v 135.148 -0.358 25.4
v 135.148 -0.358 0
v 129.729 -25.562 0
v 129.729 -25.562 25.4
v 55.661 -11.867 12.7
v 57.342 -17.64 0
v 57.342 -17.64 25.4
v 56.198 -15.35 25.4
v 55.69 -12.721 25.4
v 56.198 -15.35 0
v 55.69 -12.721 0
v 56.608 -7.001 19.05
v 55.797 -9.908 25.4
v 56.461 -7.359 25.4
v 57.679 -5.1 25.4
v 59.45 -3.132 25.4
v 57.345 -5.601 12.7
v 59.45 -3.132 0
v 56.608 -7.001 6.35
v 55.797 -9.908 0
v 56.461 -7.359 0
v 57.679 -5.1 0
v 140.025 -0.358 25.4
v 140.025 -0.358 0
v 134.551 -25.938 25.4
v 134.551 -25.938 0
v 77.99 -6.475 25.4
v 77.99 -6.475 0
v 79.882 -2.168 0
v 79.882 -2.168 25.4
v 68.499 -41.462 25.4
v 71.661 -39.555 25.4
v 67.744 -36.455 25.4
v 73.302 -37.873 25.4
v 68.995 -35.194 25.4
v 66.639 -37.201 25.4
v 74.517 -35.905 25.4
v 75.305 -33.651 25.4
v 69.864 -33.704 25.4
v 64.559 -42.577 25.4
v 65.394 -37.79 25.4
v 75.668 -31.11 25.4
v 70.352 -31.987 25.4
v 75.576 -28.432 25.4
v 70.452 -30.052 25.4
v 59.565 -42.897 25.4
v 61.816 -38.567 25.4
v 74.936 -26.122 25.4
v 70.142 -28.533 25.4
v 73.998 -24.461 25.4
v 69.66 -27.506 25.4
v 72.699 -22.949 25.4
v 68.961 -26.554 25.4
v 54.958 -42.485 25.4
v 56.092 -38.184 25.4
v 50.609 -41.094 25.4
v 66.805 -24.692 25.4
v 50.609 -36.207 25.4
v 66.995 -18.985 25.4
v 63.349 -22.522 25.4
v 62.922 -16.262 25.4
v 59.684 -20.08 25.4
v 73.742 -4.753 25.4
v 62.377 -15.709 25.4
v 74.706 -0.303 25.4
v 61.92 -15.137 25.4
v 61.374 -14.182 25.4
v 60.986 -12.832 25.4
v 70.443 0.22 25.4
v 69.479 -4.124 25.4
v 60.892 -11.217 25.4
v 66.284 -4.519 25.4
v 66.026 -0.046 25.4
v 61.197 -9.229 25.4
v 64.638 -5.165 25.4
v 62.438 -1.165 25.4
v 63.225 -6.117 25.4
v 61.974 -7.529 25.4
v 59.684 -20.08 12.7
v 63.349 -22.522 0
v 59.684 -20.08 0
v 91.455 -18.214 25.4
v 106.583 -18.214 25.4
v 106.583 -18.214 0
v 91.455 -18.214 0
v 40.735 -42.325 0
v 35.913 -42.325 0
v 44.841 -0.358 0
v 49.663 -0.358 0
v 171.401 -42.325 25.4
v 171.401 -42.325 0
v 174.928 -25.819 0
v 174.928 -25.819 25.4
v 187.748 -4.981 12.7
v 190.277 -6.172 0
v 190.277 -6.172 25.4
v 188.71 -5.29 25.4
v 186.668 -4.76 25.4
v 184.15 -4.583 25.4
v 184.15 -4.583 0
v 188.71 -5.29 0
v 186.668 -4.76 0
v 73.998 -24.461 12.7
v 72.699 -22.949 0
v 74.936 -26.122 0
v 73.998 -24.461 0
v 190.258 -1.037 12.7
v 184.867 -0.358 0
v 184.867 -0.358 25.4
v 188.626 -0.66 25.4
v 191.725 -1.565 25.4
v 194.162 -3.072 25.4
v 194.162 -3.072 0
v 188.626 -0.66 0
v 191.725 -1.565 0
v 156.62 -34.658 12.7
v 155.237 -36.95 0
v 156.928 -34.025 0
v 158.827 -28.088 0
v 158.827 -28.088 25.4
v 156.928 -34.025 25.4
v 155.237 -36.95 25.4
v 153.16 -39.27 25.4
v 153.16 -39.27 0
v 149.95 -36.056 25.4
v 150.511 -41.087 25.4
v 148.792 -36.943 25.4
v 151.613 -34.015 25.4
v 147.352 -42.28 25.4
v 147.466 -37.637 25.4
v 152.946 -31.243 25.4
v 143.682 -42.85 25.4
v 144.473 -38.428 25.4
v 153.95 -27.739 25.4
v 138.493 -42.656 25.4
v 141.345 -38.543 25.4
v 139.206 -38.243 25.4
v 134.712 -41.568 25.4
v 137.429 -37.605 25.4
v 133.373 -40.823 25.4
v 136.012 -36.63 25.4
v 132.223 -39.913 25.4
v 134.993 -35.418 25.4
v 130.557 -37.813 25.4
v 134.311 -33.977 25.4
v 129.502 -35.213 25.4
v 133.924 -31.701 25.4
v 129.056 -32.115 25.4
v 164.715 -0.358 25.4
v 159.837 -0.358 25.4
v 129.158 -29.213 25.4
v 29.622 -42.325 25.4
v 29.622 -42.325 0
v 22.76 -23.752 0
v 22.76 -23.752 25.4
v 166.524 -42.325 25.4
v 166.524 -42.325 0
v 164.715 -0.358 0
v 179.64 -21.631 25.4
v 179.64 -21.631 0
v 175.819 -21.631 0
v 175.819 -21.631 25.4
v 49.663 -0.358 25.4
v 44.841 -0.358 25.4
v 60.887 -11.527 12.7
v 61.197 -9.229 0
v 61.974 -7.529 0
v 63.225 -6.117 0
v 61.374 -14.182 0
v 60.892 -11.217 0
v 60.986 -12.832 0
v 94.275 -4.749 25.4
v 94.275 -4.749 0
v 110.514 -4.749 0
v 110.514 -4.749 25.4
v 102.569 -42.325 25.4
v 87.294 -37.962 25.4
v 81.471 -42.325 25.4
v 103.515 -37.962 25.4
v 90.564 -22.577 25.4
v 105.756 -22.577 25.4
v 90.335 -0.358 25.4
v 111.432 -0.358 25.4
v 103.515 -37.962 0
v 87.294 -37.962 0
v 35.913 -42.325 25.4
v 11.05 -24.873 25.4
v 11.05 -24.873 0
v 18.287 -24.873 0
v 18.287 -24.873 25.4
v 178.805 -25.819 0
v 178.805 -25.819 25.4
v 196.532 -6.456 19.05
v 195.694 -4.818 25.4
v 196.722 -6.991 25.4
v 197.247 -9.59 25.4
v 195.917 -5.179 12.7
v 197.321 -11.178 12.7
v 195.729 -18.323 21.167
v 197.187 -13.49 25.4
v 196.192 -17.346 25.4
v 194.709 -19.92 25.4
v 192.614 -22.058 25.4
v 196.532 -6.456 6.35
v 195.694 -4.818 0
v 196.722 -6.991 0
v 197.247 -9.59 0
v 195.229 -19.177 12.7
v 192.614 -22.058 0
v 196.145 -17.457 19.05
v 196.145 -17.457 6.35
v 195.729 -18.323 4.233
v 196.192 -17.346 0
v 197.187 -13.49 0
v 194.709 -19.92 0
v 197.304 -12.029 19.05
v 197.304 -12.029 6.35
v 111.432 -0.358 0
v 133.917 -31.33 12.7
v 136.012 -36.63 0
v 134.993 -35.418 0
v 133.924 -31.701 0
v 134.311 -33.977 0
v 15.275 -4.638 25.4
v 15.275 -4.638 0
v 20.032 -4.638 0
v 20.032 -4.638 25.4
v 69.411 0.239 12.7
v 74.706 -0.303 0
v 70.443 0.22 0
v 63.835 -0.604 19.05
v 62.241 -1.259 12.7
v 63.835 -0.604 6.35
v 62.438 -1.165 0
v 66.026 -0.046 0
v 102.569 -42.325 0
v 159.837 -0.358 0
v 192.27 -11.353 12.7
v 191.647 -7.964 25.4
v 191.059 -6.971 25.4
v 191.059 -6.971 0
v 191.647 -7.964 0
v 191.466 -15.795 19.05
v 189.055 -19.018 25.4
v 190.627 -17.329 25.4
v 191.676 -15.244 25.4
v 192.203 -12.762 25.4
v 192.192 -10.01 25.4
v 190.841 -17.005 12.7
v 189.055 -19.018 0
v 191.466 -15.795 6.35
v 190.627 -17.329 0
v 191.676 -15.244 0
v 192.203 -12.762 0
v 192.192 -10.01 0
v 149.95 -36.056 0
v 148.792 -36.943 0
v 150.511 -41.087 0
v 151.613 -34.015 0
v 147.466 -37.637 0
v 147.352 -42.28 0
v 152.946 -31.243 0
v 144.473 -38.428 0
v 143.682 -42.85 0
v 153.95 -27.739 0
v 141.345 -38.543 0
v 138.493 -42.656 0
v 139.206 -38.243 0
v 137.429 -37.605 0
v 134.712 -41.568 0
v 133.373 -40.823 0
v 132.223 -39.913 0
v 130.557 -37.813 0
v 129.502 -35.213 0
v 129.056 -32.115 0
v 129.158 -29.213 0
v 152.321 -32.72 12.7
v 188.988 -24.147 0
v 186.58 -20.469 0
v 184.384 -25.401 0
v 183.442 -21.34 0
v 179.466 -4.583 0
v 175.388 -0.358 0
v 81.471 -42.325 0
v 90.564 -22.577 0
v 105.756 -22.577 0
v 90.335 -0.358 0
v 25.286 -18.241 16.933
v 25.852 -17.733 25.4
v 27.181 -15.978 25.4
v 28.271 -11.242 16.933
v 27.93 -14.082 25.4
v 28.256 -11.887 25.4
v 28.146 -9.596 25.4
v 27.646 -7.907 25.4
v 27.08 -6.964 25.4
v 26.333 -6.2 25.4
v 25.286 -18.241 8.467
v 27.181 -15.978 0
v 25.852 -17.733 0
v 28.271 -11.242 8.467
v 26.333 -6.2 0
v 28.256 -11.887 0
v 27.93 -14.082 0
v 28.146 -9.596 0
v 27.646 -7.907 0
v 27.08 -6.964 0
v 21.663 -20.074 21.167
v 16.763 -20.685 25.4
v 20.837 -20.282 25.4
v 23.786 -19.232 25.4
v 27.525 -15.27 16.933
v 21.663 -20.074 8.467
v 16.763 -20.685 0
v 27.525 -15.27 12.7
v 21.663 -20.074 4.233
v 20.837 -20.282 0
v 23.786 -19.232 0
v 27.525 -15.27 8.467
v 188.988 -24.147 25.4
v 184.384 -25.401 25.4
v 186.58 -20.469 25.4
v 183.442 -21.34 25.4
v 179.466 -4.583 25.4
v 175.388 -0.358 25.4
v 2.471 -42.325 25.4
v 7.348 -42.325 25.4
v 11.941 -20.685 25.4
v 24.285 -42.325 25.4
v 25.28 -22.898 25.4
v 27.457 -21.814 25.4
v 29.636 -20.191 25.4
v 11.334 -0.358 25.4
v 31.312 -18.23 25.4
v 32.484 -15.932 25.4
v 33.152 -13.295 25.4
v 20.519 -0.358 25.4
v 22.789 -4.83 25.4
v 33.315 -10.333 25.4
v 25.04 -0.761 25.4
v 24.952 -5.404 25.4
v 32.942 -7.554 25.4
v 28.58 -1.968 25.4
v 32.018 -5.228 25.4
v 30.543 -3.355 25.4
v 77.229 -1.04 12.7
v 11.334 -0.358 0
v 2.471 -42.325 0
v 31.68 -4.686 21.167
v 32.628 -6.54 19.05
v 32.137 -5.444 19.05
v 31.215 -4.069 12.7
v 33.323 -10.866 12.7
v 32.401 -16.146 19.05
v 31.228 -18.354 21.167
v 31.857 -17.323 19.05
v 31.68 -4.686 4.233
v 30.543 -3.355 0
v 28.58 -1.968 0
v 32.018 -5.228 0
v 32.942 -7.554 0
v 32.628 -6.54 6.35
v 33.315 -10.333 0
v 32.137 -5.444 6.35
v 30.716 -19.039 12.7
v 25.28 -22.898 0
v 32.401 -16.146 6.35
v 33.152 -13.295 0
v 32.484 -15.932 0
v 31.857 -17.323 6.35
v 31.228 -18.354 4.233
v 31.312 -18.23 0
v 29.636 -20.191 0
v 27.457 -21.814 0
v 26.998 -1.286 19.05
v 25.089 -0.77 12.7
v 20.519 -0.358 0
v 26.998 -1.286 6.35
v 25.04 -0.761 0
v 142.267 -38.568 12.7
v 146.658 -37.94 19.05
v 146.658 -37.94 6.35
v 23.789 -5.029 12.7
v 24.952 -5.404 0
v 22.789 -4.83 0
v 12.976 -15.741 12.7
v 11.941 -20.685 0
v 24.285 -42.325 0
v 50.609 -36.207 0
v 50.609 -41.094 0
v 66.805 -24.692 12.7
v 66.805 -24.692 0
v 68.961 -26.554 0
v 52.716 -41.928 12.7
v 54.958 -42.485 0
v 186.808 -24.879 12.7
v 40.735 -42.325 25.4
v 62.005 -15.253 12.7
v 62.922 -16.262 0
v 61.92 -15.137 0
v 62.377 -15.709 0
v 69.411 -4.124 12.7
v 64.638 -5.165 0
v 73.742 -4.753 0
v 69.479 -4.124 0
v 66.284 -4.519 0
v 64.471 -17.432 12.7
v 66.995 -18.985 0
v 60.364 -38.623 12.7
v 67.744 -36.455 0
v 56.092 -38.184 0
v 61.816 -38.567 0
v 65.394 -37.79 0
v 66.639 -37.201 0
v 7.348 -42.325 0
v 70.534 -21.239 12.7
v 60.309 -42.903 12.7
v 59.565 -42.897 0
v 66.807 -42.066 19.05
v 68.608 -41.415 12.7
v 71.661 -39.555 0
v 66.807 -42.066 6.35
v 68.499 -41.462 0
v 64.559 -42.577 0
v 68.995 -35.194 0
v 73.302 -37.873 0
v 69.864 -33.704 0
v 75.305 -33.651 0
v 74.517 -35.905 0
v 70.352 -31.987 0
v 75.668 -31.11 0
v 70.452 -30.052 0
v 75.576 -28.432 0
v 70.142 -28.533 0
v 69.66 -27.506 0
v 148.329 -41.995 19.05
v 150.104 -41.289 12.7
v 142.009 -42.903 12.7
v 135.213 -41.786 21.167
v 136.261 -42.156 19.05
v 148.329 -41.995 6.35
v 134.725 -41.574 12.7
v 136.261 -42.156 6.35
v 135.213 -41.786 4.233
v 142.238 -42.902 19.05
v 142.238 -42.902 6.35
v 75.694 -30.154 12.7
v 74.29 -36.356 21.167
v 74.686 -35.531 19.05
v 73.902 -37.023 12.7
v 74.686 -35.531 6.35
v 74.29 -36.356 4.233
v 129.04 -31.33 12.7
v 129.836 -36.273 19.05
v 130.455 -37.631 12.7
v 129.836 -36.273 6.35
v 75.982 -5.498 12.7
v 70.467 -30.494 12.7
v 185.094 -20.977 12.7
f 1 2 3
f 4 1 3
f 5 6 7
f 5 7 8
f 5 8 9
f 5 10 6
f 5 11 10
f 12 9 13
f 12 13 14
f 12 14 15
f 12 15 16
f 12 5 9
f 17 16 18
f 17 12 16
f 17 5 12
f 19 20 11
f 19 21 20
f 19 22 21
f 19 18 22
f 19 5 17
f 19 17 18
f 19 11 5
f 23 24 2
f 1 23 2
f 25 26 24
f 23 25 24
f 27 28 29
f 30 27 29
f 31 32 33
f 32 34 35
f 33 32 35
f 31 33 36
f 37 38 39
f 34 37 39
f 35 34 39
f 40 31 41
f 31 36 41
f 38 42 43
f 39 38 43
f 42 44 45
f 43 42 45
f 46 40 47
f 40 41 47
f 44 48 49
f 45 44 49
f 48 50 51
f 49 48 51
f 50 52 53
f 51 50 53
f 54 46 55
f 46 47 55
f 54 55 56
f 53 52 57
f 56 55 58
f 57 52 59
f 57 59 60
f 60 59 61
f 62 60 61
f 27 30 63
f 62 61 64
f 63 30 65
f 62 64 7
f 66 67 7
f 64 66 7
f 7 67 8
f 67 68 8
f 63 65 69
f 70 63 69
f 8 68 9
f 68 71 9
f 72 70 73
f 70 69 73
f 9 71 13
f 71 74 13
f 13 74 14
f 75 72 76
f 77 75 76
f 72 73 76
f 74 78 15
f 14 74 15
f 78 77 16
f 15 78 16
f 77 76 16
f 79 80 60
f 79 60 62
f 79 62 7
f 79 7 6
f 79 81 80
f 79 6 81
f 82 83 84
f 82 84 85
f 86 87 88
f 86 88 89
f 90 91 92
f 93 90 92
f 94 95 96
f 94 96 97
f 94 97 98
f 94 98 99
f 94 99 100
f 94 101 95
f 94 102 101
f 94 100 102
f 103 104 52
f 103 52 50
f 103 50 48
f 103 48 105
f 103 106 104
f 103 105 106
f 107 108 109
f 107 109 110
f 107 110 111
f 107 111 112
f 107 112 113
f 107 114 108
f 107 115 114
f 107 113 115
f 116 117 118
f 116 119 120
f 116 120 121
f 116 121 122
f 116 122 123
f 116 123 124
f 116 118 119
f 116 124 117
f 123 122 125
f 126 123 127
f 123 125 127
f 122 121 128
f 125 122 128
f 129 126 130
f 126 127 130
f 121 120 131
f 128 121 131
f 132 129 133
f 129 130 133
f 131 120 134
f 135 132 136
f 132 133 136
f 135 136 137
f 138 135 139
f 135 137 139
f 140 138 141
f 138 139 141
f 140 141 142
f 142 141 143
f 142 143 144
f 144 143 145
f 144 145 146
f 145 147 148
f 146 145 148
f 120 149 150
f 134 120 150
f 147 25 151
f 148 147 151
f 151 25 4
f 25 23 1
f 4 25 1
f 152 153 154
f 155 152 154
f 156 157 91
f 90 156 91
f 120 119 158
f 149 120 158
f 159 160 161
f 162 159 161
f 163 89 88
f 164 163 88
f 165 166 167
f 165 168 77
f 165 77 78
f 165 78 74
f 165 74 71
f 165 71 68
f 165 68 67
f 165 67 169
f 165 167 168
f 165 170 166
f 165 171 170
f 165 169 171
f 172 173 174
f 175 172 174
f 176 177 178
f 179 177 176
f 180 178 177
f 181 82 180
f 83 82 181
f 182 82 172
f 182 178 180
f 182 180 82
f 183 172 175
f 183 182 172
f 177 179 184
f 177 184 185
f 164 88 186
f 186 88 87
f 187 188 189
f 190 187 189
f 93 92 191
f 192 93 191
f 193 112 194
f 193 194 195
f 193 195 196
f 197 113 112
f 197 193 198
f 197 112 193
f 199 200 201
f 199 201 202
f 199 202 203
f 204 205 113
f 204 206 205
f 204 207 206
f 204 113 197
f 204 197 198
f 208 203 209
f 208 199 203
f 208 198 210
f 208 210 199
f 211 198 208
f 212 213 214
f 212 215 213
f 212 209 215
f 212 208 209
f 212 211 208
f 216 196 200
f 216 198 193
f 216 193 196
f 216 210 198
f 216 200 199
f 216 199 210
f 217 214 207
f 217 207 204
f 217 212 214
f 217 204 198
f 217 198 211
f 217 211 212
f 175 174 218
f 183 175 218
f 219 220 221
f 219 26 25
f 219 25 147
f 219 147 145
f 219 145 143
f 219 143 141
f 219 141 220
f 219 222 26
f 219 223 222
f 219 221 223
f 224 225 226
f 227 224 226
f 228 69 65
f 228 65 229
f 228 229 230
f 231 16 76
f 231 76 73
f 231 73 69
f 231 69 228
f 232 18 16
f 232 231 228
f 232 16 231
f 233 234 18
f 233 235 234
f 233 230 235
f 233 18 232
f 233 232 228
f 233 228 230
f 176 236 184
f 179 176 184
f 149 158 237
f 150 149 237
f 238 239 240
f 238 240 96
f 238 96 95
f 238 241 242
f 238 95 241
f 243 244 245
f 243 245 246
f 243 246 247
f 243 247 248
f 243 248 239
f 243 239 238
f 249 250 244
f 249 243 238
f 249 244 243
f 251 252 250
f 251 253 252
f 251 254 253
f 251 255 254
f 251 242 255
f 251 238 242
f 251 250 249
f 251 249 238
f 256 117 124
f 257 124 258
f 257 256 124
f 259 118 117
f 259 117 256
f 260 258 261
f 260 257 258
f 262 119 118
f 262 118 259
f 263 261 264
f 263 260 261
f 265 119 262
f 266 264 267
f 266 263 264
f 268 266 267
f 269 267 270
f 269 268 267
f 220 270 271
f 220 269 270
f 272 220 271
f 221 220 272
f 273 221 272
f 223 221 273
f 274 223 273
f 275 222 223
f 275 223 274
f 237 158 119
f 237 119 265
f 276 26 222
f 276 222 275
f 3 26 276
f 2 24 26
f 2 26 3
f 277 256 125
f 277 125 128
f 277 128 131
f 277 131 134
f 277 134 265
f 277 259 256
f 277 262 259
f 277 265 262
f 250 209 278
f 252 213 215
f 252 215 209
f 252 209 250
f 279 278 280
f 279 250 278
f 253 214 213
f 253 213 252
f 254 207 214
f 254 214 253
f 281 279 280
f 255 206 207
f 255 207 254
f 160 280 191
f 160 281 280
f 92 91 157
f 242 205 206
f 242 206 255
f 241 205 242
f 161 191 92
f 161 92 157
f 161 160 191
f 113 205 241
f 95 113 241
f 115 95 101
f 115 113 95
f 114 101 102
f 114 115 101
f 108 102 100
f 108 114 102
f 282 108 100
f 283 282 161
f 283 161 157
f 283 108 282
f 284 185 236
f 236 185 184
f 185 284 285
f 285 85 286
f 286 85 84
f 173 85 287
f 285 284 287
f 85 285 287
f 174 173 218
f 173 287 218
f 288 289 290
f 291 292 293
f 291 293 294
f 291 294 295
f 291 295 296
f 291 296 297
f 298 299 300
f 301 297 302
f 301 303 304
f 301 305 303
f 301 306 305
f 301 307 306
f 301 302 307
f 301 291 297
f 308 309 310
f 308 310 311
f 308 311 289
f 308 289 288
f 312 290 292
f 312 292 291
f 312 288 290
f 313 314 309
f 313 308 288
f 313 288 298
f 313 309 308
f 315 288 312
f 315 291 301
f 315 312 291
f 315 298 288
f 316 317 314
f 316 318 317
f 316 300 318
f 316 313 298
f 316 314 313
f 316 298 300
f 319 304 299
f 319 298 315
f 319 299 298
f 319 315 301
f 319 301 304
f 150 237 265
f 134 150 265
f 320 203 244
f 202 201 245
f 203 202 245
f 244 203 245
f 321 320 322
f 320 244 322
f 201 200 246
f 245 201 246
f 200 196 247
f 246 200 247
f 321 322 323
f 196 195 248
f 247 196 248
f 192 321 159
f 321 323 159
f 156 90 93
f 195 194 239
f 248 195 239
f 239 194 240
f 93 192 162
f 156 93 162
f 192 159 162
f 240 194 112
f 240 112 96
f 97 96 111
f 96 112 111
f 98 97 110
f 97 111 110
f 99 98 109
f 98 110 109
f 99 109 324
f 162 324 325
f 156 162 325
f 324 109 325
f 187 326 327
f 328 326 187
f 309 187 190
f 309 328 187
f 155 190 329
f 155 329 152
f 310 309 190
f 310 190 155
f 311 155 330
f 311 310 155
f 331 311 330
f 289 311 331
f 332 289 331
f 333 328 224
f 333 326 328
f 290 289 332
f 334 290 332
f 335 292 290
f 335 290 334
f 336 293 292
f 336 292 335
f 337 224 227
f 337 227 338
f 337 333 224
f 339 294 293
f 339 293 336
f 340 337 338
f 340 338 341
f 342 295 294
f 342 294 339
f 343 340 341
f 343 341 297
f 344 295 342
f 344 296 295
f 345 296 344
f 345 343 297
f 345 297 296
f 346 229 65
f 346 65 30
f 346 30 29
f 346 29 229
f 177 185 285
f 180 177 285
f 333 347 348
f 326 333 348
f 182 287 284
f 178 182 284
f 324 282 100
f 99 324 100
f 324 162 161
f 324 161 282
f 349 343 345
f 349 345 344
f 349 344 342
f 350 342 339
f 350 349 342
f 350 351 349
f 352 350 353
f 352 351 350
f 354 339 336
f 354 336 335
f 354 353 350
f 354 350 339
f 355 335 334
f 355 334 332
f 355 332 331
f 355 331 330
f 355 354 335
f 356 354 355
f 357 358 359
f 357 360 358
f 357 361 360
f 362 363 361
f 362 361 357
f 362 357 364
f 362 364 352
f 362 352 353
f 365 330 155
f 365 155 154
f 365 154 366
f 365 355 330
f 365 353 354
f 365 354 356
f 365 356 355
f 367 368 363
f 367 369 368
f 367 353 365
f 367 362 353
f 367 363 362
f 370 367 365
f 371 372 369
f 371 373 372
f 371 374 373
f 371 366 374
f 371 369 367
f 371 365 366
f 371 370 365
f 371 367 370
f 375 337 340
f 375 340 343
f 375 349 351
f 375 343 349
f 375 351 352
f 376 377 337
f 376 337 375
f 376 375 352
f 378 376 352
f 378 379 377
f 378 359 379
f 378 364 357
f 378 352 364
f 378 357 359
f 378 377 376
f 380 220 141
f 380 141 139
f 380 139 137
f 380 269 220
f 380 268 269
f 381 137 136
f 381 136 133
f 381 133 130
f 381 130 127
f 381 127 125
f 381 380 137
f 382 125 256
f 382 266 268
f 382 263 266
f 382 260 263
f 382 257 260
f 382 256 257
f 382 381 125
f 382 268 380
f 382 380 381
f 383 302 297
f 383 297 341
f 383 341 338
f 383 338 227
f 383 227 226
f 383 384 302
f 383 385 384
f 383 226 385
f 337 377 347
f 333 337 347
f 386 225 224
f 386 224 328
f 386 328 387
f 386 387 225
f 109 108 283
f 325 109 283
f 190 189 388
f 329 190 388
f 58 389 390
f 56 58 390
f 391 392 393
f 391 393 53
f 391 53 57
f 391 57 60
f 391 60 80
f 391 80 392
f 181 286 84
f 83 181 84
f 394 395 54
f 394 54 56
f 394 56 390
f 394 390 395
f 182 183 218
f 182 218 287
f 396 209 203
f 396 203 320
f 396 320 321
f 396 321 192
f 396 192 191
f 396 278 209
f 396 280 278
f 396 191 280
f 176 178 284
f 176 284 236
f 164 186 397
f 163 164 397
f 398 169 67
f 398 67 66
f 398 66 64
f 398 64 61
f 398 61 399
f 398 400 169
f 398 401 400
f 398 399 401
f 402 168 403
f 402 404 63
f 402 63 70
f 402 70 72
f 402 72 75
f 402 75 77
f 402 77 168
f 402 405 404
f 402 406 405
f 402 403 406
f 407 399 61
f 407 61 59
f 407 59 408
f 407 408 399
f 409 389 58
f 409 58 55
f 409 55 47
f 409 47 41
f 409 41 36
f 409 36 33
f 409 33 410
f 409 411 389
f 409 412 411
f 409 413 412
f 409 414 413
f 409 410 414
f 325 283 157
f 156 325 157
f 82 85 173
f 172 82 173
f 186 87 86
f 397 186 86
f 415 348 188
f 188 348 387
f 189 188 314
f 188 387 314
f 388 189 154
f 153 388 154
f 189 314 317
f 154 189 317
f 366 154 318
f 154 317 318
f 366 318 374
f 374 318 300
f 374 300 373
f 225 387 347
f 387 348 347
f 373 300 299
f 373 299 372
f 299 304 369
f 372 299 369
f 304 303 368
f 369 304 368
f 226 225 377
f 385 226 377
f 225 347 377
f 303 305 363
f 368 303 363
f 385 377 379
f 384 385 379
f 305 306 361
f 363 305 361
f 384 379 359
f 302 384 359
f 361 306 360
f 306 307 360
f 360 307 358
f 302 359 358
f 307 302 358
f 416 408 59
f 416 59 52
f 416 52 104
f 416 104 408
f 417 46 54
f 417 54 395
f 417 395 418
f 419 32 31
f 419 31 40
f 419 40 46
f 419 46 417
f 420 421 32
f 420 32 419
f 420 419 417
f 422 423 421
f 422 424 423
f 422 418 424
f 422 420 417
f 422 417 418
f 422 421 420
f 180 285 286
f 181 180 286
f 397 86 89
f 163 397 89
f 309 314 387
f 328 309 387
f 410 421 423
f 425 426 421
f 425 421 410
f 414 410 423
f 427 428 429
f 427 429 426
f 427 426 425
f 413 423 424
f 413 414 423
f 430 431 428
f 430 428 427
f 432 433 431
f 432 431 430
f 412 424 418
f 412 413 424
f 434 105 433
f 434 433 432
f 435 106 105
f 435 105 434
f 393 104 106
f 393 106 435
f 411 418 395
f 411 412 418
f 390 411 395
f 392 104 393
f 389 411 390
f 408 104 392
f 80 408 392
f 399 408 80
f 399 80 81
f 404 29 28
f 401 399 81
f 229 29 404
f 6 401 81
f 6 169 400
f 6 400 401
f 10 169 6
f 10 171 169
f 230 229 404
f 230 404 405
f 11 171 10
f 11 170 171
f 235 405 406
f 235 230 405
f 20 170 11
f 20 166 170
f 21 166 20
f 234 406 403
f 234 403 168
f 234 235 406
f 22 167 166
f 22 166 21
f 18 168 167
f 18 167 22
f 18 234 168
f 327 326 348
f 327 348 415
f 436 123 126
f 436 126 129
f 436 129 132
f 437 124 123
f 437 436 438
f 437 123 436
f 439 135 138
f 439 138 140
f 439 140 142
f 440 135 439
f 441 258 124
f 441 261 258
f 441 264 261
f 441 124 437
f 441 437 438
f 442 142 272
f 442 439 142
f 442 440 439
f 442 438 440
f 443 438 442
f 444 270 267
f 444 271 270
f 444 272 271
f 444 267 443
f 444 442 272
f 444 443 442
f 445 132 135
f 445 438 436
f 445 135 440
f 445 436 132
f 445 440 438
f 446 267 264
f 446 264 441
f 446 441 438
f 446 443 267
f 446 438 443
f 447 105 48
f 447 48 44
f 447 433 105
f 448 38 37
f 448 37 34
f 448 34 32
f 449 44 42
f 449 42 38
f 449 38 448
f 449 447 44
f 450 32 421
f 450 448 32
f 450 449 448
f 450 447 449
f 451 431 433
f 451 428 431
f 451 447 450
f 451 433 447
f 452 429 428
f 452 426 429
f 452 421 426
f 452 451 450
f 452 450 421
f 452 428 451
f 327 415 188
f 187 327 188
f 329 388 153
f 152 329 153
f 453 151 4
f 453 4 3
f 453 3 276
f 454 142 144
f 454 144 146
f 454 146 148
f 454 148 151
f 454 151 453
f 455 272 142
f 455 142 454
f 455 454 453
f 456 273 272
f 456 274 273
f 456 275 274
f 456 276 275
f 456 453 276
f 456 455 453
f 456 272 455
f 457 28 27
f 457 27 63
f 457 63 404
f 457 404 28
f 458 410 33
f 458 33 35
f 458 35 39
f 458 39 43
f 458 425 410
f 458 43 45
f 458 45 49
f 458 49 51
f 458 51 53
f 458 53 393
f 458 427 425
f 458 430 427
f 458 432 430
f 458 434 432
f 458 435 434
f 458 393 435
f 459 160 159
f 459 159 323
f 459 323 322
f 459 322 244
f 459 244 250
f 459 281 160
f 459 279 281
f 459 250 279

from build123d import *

# Parameters (mm, degrees)
F2_DEPTH = 25.4


with BuildPart() as f2:
    # F1 (on face) → F2 (new body)
    with BuildSketch(Plane.XY):
        Polygon((90.3345299513, -0.3582152179), (81.4709995595, -42.3245057464), (102.5689573936, -42.3245057464), (103.5150129691, -37.9616280924), (87.2942931019, -37.9616280924), (90.564155091, -22.5767437336), (105.7561543324, -22.5767437336), (106.5828048352, -18.2138660797), (91.4551006329, -18.2138660797), (94.2748973482, -4.7486478886), (110.5139872266, -4.7486478886), (111.4324877854, -0.3582152179), align=None)
    extrude(amount=F2_DEPTH)


with BuildPart() as f2b:
    # F1 (on face) → F2, piece 2 (new body)
    with BuildSketch(Plane.XY):
        with BuildLine():
            add(Edge.make_bspline(
                [(75.6936310451, -30.1543733432), (75.6936310451, -36.2072920252), (71.6614135923, -39.5552265618)],
                knots=[0, 0, 0, 1, 1, 1], degree=2))
            add(Edge.make_bspline(
                [(74.9358680841, -26.1221558903), (75.6936310451, -27.8581219463), (75.6936310451, -30.1543733432)],
                knots=[0, 0, 0, 1, 1, 1], degree=2))
            add(Edge.make_bspline(
                [(72.6993192236, -22.9487364599), (74.1781051232, -24.3861898343), (74.9358680841, -26.1221558903)],
                knots=[0, 0, 0, 1, 1, 1], degree=2))
            add(Edge.make_bspline(
                [(66.9954307539, -18.985406549), (71.2205333241, -21.5112830855), (72.6993192236, -22.9487364599)],
                knots=[0, 0, 0, 1, 1, 1], degree=2))
            add(Edge.make_bspline(
                [(62.9218807759, -16.2620523923), (63.9827489213, -17.2402554874), (66.9954307539, -18.985406549)],
                knots=[0, 0, 0, 1, 1, 1], degree=2))
            add(Edge.make_bspline(
                [(61.3742073345, -14.1816486268), (61.8610126306, -15.2838492973), (62.9218807759, -16.2620523923)],
                knots=[0, 0, 0, 1, 1, 1], degree=2))
            add(Edge.make_bspline(
                [(60.8874020383, -11.5271820121), (60.8874020383, -13.0794479563), (61.3742073345, -14.1816486268)],
                knots=[0, 0, 0, 1, 1, 1], degree=2))
            add(Edge.make_bspline(
                [(63.2249859603, -6.1172137212), (60.8874020383, -8.1103599336), (60.8874020383, -11.5271820121)],
                knots=[0, 0, 0, 1, 1, 1], degree=2))
            add(Edge.make_bspline(
                [(69.4110872234, -4.1240675087), (65.5625698823, -4.1240675087), (63.2249859603, -6.1172137212)],
                knots=[0, 0, 0, 1, 1, 1], degree=2))
            add(Edge.make_bspline(
                [(73.7418173578, -4.7532403914), (71.3858634246, -4.1240675087), (69.4110872234, -4.1240675087)],
                knots=[0, 0, 0, 1, 1, 1], degree=2))
            add(Edge.make_bspline(
                [(77.9898824419, -6.4754289391), (76.0977712909, -5.3824132742), (73.7418173578, -4.7532403914)],
                knots=[0, 0, 0, 1, 1, 1], degree=2))
            Line((77.9898824419, -6.4754289391), (79.8819935929, -2.1676613186))
            add(Edge.make_bspline(
                [(74.7062429445, -0.3031051844), (77.1632319391, -0.845020514), (79.8819935929, -2.1676613186)],
                knots=[0, 0, 0, 1, 1, 1], degree=2))
            add(Edge.make_bspline(
                [(69.4110872234, 0.2388101453), (72.2492539498, 0.2388101453), (74.7062429445, -0.3031051844)],
                knots=[0, 0, 0, 1, 1, 1], degree=2))
            add(Edge.make_bspline(
                [(59.4499486639, -3.1320869053), (63.2387634687, 0.2388101453), (69.4110872234, 0.2388101453)],
                knots=[0, 0, 0, 1, 1, 1], degree=2))
            add(Edge.make_bspline(
                [(55.6611338592, -11.8670272188), (55.6611338592, -6.5029839558), (59.4499486639, -3.1320869053)],
                knots=[0, 0, 0, 1, 1, 1], degree=2))
            add(Edge.make_bspline(
                [(57.3419898816, -17.6398032304), (55.6611338592, -15.201184247), (55.6611338592, -11.8670272188)],
                knots=[0, 0, 0, 1, 1, 1], degree=2))
            add(Edge.make_bspline(
                [(63.3489835357, -22.5216337001), (59.0228459041, -20.0784222139), (57.3419898816, -17.6398032304)],
                knots=[0, 0, 0, 1, 1, 1], degree=2))
            add(Edge.make_bspline(
                [(68.9610219496, -26.5538511529), (67.4546810333, -24.8454401137), (63.3489835357, -22.5216337001)],
                knots=[0, 0, 0, 1, 1, 1], degree=2))
            add(Edge.make_bspline(
                [(70.4673628659, -30.4942185499), (70.4673628659, -28.2622621922), (68.9610219496, -26.5538511529)],
                knots=[0, 0, 0, 1, 1, 1], degree=2))
            add(Edge.make_bspline(
                [(67.7440087093, -36.4552871761), (70.4673628659, -34.2876258575), (70.4673628659, -30.4942185499)],
                knots=[0, 0, 0, 1, 1, 1], degree=2))
            add(Edge.make_bspline(
                [(60.3638567199, -38.6229484947), (65.0206545526, -38.6229484947), (67.7440087093, -36.4552871761)],
                knots=[0, 0, 0, 1, 1, 1], degree=2))
            add(Edge.make_bspline(
                [(50.6093807861, -36.2072920252), (55.2569936133, -38.6229484947), (60.3638567199, -38.6229484947)],
                knots=[0, 0, 0, 1, 1, 1], degree=2))
            Line((50.6093807861, -36.2072920252), (50.6093807861, -41.0937149977))
            add(Edge.make_bspline(
                [(54.9584809317, -42.4852433441), (52.6484520265, -42.0673255899), (50.6093807861, -41.0937149977)],
                knots=[0, 0, 0, 1, 1, 1], degree=2))
            add(Edge.make_bspline(
                [(60.3087466863, -42.9031610984), (57.2685098369, -42.9031610984), (54.9584809317, -42.4852433441)],
                knots=[0, 0, 0, 1, 1, 1], degree=2))
            add(Edge.make_bspline(
                [(71.6614135923, -39.5552265618), (67.6291961394, -42.9031610984), (60.3087466863, -42.9031610984)],
                knots=[0, 0, 0, 1, 1, 1], degree=2))
        make_face()
    extrude(amount=F2_DEPTH)


with BuildPart() as f2c:
    # F1 (on face) → F2, piece 3 (new body)
    with BuildSketch(Plane.XY):
        Polygon((49.6633252106, -0.3582152179), (44.8411972773, -0.3582152179), (35.9133718464, -42.3245057464), (40.7354997798, -42.3245057464), align=None)
    extrude(amount=F2_DEPTH)


with BuildPart() as f2d:
    # F1 (on face) → F2, piece 4 (new body)
    with BuildSketch(Plane.XY):
        with BuildLine():
            add(Edge.make_bspline(
                [(158.8271166159, -28.087747086), (157.2472956549, -35.6378216788), (153.1599681685, -39.2704913886)],
                knots=[0, 0, 0, 1, 1, 1], degree=2))
            Line((158.8271166159, -28.087747086), (164.7147051974, -0.3582152179))
            Line((164.7147051974, -0.3582152179), (159.8374672305, -0.3582152179))
            Line((159.8374672305, -0.3582152179), (153.949878649, -27.7387168737))
            add(Edge.make_bspline(
                [(149.9498087158, -36.055739433), (152.6915328836, -33.5436404049), (153.949878649, -27.7387168737)],
                knots=[0, 0, 0, 1, 1, 1], degree=2))
            add(Edge.make_bspline(
                [(142.266551542, -38.5678384612), (147.208084548, -38.5678384612), (149.9498087158, -36.055739433)],
                knots=[0, 0, 0, 1, 1, 1], degree=2))
            add(Edge.make_bspline(
                [(136.011562737, -36.6298022822), (138.1057440109, -38.5678384612), (142.266551542, -38.5678384612)],
                knots=[0, 0, 0, 1, 1, 1], degree=2))
            add(Edge.make_bspline(
                [(133.9173814631, -31.3300540583), (133.9173814631, -34.6917661033), (136.011562737, -36.6298022822)],
                knots=[0, 0, 0, 1, 1, 1], degree=2))
            add(Edge.make_bspline(
                [(134.5511468486, -25.9384557786), (133.9173814631, -28.978692628), (133.9173814631, -31.3300540583)],
                knots=[0, 0, 0, 1, 1, 1], degree=2))
            Line((134.5511468486, -25.9384557786), (140.0254101787, -0.3582152179))
            Line((140.0254101787, -0.3582152179), (135.1481722118, -0.3582152179))
            Line((135.1481722118, -0.3582152179), (129.7290189153, -25.5618705495))
            add(Edge.make_bspline(
                [(129.0401434962, -31.3300540583), (129.0401434962, -29.0062476448), (129.7290189153, -25.5618705495)],
                knots=[0, 0, 0, 1, 1, 1], degree=2))
            add(Edge.make_bspline(
                [(132.2227479322, -39.9134417797), (129.0401434962, -36.923722461), (129.0401434962, -31.3300540583)],
                knots=[0, 0, 0, 1, 1, 1], degree=2))
            add(Edge.make_bspline(
                [(142.0093713855, -42.9031610984), (135.4053523683, -42.9031610984), (132.2227479322, -39.9134417797)],
                knots=[0, 0, 0, 1, 1, 1], degree=2))
            add(Edge.make_bspline(
                [(153.1599681685, -39.2704913886), (149.0726406822, -42.9031610984), (142.0093713855, -42.9031610984)],
                knots=[0, 0, 0, 1, 1, 1], degree=2))
        make_face()
    extrude(amount=F2_DEPTH)


with BuildPart() as f2e:
    # F1 (on face) → F2, piece 5 (new body)
    with BuildSketch(Plane.XY):
        with BuildLine():
            Line((2.470766503, -42.3245057464), (7.3480044699, -42.3245057464))
            Line((7.3480044699, -42.3245057464), (11.0495617215, -24.8729951305))
            Line((11.0495617215, -24.8729951305), (18.2873461244, -24.8729951305))
            Line((18.2873461244, -24.8729951305), (24.2851547729, -42.3245057464))
            Line((24.2851547729, -42.3245057464), (29.6216430191, -42.3245057464))
            Line((29.6216430191, -42.3245057464), (22.7604438454, -23.7524244488))
            add(Edge.make_bspline(
                [(33.3232002708, -10.8658616098), (33.3232002708, -20.8499626832), (22.7604438454, -23.7524244488)],
                knots=[0, 0, 0, 1, 1, 1], degree=2))
            add(Edge.make_bspline(
                [(20.5193024821, -0.3582152179), (33.3232002708, -0.3582152179), (33.3232002708, -10.8658616098)],
                knots=[0, 0, 0, 1, 1, 1], degree=2))
            Line((20.5193024821, -0.3582152179), (11.3342968948, -0.3582152179))
            Line((11.3342968948, -0.3582152179), (2.470766503, -42.3245057464))
        make_face()
        with BuildLine():
            add(Edge.make_bspline(
                [(15.2746642917, -4.6384278216), (12.3446475094, -18.8200764484), (11.9405072635, -20.6846325826)],
                knots=[0, 0, 0, 1, 1, 1], degree=2))
            Line((15.2746642917, -4.6384278216), (20.0324971859, -4.6384278216))
            add(Edge.make_bspline(
                [(26.3334110188, -6.1998787714), (24.3953748399, -4.6384278216), (20.0324971859, -4.6384278216)],
                knots=[0, 0, 0, 1, 1, 1], degree=2))
            add(Edge.make_bspline(
                [(28.2714471978, -11.2424468389), (28.2714471978, -7.7613297213), (26.3334110188, -6.1998787714)],
                knots=[0, 0, 0, 1, 1, 1], degree=2))
            add(Edge.make_bspline(
                [(25.2863203819, -18.2414210964), (28.2714471978, -15.7982096102), (28.2714471978, -11.2424468389)],
                knots=[0, 0, 0, 1, 1, 1], degree=2))
            add(Edge.make_bspline(
                [(16.7626351969, -20.6846325826), (22.301193566, -20.6846325826), (25.2863203819, -18.2414210964)],
                knots=[0, 0, 0, 1, 1, 1], degree=2))
            Line((16.7626351969, -20.6846325826), (11.9405072635, -20.6846325826))
        make_face(mode=Mode.SUBTRACT)
    extrude(amount=F2_DEPTH)


with BuildPart() as f2f:
    # F1 (on face) → F2, piece 6 (new body)
    with BuildSketch(Plane.XY):
        with BuildLine():
            add(Edge.make_bspline(
                [(197.3214750324, -11.1781517998), (197.3214750324, -18.2965311299), (192.6141596689, -22.0577909179)],
                knots=[0, 0, 0, 1, 1, 1], degree=2))
            add(Edge.make_bspline(
                [(194.1618331103, -3.072384369), (197.3214750324, -5.78655352), (197.3214750324, -11.1781517998)],
                knots=[0, 0, 0, 1, 1, 1], degree=2))
            add(Edge.make_bspline(
                [(184.866607456, -0.3582152179), (191.0021911883, -0.3582152179), (194.1618331103, -3.072384369)],
                knots=[0, 0, 0, 1, 1, 1], degree=2))
            Line((184.866607456, -0.3582152179), (175.3876816899, -0.3582152179))
            Line((175.3876816899, -0.3582152179), (166.5241512981, -42.3245057464))
            Line((166.5241512981, -42.3245057464), (171.401389265, -42.3245057464))
            Line((171.401389265, -42.3245057464), (174.9284314105, -25.819050706))
            Line((174.9284314105, -25.819050706), (178.8045037683, -25.819050706))
            add(Edge.make_bspline(
                [(192.6141596689, -22.0577909179), (187.9068443054, -25.819050706), (178.8045037683, -25.819050706)],
                knots=[0, 0, 0, 1, 1, 1], degree=2))
        make_face()
        with BuildLine():
            add(Edge.make_bspline(
                [(179.6403392768, -21.6306881581), (185.8402180482, -21.6306881581), (189.0549700038, -19.0175540685)],
                knots=[0, 0, 0, 1, 1, 1], degree=2))
            Line((179.6403392768, -21.6306881581), (175.8193769525, -21.6306881581))
            Line((175.8193769525, -21.6306881581), (179.4658241706, -4.5833177881))
            Line((179.4658241706, -4.5833177881), (184.1501770202, -4.5833177881))
            add(Edge.make_bspline(
                [(190.2765757469, -6.1723237547), (188.2834295344, -4.5833177881), (184.1501770202, -4.5833177881)],
                knots=[0, 0, 0, 1, 1, 1], degree=2))
            add(Edge.make_bspline(
                [(192.2697219593, -11.3526669059), (192.2697219593, -7.7613297213), (190.2765757469, -6.1723237547)],
                knots=[0, 0, 0, 1, 1, 1], degree=2))
            add(Edge.make_bspline(
                [(189.0549700038, -19.0175540685), (192.2697219593, -16.404419979), (192.2697219593, -11.3526669059)],
                knots=[0, 0, 0, 1, 1, 1], degree=2))
        make_face(mode=Mode.SUBTRACT)
    extrude(amount=F2_DEPTH)


solid = Compound([f2.part, f2b.part, f2c.part, f2d.part, f2e.part, f2f.part])
